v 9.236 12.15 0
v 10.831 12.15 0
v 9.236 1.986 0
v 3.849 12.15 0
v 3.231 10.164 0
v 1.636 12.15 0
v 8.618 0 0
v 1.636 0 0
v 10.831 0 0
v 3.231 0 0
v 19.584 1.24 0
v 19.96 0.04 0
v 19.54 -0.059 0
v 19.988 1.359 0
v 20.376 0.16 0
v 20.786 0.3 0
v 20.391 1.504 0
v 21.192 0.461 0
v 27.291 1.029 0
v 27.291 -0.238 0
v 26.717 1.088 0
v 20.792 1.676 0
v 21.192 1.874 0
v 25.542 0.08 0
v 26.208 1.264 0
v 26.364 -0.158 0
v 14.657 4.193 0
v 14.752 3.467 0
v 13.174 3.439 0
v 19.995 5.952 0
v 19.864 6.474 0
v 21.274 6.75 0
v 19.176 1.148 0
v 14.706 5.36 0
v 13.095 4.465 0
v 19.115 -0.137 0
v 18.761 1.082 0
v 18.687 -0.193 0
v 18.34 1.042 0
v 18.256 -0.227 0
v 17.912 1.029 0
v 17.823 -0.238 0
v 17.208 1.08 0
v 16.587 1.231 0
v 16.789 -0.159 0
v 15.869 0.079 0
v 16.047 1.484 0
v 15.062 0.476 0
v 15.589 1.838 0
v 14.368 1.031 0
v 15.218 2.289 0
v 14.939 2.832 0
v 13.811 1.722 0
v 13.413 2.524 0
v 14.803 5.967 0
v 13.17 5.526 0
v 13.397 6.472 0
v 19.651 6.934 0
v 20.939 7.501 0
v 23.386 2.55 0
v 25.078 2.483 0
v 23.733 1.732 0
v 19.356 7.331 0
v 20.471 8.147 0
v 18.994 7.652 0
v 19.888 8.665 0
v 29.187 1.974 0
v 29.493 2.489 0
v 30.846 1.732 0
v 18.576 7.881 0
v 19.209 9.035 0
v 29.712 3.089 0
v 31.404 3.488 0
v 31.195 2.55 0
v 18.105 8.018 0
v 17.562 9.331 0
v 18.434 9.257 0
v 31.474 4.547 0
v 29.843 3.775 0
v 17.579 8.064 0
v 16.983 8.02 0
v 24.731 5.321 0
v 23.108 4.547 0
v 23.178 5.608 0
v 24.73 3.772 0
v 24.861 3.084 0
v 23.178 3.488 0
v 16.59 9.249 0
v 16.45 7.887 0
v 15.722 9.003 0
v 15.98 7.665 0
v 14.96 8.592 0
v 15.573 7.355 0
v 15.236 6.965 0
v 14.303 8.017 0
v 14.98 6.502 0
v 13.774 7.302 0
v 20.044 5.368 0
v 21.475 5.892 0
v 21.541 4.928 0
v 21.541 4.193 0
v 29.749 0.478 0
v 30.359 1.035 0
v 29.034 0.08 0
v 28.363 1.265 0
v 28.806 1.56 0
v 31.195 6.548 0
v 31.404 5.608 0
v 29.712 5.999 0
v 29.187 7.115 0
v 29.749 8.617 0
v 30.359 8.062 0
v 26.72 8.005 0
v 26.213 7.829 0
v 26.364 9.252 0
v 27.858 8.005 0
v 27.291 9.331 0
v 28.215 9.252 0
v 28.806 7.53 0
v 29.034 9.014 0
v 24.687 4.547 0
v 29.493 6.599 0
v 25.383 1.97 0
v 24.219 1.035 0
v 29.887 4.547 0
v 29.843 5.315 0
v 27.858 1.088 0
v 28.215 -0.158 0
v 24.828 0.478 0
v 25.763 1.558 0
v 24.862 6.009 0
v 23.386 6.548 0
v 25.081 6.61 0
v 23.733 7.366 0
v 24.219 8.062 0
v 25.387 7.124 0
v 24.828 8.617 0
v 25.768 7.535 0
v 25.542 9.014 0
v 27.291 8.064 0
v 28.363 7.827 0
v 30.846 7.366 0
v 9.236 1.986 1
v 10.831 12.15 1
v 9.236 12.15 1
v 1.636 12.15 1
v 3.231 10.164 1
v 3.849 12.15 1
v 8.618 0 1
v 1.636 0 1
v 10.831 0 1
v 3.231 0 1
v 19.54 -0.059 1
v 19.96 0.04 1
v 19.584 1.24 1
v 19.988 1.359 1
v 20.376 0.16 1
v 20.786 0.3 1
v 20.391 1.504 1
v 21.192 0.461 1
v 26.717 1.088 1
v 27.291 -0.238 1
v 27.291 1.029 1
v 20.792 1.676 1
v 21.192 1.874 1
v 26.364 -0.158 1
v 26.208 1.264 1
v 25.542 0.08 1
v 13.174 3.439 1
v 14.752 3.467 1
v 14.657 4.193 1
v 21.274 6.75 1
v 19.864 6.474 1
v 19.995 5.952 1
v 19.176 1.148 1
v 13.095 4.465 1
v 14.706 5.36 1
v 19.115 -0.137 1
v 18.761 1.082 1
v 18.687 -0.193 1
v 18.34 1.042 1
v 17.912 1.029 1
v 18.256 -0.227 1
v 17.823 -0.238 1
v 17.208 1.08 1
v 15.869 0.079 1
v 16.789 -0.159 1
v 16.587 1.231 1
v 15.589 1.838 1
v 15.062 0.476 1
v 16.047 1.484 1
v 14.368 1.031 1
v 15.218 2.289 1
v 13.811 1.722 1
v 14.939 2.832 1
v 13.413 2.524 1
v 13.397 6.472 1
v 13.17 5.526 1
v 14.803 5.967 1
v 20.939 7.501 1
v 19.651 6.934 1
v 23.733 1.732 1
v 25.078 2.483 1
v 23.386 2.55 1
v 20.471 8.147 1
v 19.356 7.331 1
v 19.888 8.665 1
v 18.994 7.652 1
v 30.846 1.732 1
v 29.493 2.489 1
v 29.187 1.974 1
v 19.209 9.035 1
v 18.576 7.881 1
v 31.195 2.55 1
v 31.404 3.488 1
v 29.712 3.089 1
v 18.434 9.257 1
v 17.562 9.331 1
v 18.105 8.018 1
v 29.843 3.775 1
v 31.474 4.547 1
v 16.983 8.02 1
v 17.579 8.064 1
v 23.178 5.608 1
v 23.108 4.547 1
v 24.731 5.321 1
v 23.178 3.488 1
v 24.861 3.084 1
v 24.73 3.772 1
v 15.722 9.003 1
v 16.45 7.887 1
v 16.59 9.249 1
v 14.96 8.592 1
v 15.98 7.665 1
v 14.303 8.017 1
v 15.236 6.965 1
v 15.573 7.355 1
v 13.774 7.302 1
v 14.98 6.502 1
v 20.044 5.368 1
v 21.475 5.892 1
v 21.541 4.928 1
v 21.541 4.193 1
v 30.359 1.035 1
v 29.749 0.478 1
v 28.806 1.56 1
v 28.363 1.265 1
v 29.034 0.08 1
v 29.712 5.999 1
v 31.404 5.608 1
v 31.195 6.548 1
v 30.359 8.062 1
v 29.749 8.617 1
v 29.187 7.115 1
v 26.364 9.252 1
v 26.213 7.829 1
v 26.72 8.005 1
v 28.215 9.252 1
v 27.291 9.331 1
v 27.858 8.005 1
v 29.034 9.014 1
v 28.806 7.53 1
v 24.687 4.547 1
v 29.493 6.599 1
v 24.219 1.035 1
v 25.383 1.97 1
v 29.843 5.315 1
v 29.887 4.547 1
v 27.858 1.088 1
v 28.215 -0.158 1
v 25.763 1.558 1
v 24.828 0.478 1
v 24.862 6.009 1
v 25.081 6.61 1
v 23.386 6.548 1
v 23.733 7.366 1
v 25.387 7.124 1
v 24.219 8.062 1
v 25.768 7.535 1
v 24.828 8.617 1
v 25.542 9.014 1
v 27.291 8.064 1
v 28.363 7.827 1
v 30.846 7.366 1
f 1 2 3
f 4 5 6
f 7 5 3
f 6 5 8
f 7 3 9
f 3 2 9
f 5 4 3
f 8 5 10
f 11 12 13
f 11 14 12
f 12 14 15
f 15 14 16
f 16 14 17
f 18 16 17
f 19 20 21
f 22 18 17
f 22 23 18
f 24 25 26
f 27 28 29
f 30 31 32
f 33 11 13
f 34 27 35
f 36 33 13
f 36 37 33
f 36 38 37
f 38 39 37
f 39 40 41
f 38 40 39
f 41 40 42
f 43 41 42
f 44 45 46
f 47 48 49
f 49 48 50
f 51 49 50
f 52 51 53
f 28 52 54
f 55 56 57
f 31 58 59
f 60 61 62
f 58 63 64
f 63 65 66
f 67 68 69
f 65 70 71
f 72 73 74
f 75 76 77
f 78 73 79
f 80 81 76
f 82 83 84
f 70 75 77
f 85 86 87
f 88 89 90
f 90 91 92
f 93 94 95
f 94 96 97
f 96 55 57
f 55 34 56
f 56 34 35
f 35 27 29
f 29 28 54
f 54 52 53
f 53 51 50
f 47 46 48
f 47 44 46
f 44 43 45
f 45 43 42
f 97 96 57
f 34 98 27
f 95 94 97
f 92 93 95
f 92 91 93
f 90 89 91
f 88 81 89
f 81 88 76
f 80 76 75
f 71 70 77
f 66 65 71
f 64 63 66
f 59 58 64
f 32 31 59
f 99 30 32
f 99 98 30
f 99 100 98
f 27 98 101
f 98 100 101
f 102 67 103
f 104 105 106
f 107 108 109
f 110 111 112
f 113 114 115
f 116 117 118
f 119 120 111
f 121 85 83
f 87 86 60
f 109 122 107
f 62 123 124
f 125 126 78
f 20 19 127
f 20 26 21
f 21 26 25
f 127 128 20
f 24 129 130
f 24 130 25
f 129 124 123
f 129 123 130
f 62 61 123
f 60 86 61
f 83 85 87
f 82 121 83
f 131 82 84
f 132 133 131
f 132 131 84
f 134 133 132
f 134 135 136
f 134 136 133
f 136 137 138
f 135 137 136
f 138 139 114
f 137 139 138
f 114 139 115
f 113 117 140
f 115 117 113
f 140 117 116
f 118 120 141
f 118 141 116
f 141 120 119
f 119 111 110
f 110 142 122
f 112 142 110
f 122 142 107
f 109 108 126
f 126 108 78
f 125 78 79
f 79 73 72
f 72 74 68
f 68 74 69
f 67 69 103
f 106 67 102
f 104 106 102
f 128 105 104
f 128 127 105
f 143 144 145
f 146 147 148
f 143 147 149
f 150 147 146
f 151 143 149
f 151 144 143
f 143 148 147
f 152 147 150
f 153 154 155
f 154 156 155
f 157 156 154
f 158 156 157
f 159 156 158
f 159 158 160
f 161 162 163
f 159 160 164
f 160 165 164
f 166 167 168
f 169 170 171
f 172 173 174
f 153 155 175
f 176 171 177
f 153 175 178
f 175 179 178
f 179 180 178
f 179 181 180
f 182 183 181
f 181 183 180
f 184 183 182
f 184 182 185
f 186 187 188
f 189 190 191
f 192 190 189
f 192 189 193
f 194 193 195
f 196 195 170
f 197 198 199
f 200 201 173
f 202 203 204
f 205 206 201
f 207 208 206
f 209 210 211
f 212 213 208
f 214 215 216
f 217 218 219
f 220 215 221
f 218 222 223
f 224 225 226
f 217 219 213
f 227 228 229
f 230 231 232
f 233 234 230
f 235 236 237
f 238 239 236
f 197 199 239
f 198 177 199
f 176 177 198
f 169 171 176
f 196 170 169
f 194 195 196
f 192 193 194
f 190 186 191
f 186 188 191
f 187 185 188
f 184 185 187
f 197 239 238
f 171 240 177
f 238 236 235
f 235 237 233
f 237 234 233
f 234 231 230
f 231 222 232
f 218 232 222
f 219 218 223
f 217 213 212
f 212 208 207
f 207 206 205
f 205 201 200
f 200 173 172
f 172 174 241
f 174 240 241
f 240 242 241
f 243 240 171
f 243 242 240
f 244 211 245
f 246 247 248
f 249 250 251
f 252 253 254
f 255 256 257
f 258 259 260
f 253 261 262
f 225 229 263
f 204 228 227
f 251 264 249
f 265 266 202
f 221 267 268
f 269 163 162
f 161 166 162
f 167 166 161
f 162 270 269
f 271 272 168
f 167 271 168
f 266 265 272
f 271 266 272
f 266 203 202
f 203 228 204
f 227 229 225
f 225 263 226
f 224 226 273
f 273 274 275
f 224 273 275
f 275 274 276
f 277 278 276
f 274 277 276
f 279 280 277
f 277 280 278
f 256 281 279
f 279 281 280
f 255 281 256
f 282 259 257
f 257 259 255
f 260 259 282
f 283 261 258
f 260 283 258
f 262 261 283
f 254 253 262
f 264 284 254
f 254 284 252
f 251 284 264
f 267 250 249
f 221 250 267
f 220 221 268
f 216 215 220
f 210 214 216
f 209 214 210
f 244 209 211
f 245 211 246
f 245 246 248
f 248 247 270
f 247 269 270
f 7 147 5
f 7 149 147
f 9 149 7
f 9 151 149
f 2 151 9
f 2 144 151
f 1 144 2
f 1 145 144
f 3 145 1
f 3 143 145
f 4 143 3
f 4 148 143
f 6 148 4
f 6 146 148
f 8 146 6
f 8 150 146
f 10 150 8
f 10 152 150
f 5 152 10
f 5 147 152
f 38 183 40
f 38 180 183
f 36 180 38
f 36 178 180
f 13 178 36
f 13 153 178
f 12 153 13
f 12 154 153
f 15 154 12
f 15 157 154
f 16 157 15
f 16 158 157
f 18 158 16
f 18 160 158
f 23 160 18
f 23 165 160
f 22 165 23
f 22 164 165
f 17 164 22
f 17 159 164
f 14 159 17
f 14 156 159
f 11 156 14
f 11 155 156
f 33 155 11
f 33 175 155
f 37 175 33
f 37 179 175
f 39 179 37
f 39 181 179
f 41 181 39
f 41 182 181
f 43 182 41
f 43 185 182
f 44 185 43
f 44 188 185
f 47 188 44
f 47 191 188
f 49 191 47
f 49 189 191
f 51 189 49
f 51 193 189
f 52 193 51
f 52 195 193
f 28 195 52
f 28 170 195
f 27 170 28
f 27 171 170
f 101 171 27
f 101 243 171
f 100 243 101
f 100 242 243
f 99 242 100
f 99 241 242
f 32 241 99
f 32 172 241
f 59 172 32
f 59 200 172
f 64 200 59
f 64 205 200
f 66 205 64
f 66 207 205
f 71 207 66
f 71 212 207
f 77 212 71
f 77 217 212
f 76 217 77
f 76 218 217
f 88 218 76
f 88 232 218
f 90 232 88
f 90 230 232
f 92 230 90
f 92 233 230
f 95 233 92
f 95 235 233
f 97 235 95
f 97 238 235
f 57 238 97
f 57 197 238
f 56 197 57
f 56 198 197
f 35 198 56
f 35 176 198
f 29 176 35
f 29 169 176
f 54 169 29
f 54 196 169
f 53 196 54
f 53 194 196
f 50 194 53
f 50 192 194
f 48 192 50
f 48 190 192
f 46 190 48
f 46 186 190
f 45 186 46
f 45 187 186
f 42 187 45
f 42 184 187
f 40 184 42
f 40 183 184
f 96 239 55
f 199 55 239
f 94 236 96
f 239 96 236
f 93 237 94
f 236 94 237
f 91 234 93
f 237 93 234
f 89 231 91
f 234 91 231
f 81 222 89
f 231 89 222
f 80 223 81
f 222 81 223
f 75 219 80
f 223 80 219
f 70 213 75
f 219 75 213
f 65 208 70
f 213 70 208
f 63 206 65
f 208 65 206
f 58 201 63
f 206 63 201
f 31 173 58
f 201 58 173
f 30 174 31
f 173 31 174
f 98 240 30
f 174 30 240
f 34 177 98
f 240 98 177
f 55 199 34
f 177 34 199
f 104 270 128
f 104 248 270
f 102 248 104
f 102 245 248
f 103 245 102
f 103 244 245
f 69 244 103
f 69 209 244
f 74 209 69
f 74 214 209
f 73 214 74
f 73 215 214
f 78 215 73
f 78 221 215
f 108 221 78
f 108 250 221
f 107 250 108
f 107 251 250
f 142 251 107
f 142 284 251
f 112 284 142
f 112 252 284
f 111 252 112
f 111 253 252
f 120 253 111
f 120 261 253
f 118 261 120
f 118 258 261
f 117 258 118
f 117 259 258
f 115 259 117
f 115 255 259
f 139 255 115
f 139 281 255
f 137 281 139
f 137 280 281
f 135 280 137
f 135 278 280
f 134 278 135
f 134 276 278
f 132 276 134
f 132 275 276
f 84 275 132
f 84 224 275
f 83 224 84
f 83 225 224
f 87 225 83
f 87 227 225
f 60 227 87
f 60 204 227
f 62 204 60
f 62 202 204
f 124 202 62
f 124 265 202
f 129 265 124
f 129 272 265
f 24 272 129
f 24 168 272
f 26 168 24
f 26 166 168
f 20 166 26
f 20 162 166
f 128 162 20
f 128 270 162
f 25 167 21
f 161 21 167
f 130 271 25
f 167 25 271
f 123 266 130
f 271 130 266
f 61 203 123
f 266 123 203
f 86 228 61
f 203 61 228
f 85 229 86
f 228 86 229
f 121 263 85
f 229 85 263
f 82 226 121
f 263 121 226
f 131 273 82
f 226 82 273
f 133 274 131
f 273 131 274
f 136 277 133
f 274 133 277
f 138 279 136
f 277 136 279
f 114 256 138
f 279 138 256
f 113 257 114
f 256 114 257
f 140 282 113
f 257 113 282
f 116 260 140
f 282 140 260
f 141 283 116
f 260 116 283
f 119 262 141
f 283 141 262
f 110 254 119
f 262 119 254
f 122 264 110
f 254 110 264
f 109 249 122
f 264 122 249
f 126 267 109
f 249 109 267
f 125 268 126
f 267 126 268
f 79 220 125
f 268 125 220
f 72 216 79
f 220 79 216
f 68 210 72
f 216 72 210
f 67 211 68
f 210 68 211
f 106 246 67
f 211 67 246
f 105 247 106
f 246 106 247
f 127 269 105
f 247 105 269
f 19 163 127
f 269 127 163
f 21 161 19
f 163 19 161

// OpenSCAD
module logo_Neo(thick=1) {
    linear_extrude(thick) text("Neo",size=12,language="UTF8",font="Deutsch Gothic:style=Regular",spacing=1);
}

logo_Neo();
